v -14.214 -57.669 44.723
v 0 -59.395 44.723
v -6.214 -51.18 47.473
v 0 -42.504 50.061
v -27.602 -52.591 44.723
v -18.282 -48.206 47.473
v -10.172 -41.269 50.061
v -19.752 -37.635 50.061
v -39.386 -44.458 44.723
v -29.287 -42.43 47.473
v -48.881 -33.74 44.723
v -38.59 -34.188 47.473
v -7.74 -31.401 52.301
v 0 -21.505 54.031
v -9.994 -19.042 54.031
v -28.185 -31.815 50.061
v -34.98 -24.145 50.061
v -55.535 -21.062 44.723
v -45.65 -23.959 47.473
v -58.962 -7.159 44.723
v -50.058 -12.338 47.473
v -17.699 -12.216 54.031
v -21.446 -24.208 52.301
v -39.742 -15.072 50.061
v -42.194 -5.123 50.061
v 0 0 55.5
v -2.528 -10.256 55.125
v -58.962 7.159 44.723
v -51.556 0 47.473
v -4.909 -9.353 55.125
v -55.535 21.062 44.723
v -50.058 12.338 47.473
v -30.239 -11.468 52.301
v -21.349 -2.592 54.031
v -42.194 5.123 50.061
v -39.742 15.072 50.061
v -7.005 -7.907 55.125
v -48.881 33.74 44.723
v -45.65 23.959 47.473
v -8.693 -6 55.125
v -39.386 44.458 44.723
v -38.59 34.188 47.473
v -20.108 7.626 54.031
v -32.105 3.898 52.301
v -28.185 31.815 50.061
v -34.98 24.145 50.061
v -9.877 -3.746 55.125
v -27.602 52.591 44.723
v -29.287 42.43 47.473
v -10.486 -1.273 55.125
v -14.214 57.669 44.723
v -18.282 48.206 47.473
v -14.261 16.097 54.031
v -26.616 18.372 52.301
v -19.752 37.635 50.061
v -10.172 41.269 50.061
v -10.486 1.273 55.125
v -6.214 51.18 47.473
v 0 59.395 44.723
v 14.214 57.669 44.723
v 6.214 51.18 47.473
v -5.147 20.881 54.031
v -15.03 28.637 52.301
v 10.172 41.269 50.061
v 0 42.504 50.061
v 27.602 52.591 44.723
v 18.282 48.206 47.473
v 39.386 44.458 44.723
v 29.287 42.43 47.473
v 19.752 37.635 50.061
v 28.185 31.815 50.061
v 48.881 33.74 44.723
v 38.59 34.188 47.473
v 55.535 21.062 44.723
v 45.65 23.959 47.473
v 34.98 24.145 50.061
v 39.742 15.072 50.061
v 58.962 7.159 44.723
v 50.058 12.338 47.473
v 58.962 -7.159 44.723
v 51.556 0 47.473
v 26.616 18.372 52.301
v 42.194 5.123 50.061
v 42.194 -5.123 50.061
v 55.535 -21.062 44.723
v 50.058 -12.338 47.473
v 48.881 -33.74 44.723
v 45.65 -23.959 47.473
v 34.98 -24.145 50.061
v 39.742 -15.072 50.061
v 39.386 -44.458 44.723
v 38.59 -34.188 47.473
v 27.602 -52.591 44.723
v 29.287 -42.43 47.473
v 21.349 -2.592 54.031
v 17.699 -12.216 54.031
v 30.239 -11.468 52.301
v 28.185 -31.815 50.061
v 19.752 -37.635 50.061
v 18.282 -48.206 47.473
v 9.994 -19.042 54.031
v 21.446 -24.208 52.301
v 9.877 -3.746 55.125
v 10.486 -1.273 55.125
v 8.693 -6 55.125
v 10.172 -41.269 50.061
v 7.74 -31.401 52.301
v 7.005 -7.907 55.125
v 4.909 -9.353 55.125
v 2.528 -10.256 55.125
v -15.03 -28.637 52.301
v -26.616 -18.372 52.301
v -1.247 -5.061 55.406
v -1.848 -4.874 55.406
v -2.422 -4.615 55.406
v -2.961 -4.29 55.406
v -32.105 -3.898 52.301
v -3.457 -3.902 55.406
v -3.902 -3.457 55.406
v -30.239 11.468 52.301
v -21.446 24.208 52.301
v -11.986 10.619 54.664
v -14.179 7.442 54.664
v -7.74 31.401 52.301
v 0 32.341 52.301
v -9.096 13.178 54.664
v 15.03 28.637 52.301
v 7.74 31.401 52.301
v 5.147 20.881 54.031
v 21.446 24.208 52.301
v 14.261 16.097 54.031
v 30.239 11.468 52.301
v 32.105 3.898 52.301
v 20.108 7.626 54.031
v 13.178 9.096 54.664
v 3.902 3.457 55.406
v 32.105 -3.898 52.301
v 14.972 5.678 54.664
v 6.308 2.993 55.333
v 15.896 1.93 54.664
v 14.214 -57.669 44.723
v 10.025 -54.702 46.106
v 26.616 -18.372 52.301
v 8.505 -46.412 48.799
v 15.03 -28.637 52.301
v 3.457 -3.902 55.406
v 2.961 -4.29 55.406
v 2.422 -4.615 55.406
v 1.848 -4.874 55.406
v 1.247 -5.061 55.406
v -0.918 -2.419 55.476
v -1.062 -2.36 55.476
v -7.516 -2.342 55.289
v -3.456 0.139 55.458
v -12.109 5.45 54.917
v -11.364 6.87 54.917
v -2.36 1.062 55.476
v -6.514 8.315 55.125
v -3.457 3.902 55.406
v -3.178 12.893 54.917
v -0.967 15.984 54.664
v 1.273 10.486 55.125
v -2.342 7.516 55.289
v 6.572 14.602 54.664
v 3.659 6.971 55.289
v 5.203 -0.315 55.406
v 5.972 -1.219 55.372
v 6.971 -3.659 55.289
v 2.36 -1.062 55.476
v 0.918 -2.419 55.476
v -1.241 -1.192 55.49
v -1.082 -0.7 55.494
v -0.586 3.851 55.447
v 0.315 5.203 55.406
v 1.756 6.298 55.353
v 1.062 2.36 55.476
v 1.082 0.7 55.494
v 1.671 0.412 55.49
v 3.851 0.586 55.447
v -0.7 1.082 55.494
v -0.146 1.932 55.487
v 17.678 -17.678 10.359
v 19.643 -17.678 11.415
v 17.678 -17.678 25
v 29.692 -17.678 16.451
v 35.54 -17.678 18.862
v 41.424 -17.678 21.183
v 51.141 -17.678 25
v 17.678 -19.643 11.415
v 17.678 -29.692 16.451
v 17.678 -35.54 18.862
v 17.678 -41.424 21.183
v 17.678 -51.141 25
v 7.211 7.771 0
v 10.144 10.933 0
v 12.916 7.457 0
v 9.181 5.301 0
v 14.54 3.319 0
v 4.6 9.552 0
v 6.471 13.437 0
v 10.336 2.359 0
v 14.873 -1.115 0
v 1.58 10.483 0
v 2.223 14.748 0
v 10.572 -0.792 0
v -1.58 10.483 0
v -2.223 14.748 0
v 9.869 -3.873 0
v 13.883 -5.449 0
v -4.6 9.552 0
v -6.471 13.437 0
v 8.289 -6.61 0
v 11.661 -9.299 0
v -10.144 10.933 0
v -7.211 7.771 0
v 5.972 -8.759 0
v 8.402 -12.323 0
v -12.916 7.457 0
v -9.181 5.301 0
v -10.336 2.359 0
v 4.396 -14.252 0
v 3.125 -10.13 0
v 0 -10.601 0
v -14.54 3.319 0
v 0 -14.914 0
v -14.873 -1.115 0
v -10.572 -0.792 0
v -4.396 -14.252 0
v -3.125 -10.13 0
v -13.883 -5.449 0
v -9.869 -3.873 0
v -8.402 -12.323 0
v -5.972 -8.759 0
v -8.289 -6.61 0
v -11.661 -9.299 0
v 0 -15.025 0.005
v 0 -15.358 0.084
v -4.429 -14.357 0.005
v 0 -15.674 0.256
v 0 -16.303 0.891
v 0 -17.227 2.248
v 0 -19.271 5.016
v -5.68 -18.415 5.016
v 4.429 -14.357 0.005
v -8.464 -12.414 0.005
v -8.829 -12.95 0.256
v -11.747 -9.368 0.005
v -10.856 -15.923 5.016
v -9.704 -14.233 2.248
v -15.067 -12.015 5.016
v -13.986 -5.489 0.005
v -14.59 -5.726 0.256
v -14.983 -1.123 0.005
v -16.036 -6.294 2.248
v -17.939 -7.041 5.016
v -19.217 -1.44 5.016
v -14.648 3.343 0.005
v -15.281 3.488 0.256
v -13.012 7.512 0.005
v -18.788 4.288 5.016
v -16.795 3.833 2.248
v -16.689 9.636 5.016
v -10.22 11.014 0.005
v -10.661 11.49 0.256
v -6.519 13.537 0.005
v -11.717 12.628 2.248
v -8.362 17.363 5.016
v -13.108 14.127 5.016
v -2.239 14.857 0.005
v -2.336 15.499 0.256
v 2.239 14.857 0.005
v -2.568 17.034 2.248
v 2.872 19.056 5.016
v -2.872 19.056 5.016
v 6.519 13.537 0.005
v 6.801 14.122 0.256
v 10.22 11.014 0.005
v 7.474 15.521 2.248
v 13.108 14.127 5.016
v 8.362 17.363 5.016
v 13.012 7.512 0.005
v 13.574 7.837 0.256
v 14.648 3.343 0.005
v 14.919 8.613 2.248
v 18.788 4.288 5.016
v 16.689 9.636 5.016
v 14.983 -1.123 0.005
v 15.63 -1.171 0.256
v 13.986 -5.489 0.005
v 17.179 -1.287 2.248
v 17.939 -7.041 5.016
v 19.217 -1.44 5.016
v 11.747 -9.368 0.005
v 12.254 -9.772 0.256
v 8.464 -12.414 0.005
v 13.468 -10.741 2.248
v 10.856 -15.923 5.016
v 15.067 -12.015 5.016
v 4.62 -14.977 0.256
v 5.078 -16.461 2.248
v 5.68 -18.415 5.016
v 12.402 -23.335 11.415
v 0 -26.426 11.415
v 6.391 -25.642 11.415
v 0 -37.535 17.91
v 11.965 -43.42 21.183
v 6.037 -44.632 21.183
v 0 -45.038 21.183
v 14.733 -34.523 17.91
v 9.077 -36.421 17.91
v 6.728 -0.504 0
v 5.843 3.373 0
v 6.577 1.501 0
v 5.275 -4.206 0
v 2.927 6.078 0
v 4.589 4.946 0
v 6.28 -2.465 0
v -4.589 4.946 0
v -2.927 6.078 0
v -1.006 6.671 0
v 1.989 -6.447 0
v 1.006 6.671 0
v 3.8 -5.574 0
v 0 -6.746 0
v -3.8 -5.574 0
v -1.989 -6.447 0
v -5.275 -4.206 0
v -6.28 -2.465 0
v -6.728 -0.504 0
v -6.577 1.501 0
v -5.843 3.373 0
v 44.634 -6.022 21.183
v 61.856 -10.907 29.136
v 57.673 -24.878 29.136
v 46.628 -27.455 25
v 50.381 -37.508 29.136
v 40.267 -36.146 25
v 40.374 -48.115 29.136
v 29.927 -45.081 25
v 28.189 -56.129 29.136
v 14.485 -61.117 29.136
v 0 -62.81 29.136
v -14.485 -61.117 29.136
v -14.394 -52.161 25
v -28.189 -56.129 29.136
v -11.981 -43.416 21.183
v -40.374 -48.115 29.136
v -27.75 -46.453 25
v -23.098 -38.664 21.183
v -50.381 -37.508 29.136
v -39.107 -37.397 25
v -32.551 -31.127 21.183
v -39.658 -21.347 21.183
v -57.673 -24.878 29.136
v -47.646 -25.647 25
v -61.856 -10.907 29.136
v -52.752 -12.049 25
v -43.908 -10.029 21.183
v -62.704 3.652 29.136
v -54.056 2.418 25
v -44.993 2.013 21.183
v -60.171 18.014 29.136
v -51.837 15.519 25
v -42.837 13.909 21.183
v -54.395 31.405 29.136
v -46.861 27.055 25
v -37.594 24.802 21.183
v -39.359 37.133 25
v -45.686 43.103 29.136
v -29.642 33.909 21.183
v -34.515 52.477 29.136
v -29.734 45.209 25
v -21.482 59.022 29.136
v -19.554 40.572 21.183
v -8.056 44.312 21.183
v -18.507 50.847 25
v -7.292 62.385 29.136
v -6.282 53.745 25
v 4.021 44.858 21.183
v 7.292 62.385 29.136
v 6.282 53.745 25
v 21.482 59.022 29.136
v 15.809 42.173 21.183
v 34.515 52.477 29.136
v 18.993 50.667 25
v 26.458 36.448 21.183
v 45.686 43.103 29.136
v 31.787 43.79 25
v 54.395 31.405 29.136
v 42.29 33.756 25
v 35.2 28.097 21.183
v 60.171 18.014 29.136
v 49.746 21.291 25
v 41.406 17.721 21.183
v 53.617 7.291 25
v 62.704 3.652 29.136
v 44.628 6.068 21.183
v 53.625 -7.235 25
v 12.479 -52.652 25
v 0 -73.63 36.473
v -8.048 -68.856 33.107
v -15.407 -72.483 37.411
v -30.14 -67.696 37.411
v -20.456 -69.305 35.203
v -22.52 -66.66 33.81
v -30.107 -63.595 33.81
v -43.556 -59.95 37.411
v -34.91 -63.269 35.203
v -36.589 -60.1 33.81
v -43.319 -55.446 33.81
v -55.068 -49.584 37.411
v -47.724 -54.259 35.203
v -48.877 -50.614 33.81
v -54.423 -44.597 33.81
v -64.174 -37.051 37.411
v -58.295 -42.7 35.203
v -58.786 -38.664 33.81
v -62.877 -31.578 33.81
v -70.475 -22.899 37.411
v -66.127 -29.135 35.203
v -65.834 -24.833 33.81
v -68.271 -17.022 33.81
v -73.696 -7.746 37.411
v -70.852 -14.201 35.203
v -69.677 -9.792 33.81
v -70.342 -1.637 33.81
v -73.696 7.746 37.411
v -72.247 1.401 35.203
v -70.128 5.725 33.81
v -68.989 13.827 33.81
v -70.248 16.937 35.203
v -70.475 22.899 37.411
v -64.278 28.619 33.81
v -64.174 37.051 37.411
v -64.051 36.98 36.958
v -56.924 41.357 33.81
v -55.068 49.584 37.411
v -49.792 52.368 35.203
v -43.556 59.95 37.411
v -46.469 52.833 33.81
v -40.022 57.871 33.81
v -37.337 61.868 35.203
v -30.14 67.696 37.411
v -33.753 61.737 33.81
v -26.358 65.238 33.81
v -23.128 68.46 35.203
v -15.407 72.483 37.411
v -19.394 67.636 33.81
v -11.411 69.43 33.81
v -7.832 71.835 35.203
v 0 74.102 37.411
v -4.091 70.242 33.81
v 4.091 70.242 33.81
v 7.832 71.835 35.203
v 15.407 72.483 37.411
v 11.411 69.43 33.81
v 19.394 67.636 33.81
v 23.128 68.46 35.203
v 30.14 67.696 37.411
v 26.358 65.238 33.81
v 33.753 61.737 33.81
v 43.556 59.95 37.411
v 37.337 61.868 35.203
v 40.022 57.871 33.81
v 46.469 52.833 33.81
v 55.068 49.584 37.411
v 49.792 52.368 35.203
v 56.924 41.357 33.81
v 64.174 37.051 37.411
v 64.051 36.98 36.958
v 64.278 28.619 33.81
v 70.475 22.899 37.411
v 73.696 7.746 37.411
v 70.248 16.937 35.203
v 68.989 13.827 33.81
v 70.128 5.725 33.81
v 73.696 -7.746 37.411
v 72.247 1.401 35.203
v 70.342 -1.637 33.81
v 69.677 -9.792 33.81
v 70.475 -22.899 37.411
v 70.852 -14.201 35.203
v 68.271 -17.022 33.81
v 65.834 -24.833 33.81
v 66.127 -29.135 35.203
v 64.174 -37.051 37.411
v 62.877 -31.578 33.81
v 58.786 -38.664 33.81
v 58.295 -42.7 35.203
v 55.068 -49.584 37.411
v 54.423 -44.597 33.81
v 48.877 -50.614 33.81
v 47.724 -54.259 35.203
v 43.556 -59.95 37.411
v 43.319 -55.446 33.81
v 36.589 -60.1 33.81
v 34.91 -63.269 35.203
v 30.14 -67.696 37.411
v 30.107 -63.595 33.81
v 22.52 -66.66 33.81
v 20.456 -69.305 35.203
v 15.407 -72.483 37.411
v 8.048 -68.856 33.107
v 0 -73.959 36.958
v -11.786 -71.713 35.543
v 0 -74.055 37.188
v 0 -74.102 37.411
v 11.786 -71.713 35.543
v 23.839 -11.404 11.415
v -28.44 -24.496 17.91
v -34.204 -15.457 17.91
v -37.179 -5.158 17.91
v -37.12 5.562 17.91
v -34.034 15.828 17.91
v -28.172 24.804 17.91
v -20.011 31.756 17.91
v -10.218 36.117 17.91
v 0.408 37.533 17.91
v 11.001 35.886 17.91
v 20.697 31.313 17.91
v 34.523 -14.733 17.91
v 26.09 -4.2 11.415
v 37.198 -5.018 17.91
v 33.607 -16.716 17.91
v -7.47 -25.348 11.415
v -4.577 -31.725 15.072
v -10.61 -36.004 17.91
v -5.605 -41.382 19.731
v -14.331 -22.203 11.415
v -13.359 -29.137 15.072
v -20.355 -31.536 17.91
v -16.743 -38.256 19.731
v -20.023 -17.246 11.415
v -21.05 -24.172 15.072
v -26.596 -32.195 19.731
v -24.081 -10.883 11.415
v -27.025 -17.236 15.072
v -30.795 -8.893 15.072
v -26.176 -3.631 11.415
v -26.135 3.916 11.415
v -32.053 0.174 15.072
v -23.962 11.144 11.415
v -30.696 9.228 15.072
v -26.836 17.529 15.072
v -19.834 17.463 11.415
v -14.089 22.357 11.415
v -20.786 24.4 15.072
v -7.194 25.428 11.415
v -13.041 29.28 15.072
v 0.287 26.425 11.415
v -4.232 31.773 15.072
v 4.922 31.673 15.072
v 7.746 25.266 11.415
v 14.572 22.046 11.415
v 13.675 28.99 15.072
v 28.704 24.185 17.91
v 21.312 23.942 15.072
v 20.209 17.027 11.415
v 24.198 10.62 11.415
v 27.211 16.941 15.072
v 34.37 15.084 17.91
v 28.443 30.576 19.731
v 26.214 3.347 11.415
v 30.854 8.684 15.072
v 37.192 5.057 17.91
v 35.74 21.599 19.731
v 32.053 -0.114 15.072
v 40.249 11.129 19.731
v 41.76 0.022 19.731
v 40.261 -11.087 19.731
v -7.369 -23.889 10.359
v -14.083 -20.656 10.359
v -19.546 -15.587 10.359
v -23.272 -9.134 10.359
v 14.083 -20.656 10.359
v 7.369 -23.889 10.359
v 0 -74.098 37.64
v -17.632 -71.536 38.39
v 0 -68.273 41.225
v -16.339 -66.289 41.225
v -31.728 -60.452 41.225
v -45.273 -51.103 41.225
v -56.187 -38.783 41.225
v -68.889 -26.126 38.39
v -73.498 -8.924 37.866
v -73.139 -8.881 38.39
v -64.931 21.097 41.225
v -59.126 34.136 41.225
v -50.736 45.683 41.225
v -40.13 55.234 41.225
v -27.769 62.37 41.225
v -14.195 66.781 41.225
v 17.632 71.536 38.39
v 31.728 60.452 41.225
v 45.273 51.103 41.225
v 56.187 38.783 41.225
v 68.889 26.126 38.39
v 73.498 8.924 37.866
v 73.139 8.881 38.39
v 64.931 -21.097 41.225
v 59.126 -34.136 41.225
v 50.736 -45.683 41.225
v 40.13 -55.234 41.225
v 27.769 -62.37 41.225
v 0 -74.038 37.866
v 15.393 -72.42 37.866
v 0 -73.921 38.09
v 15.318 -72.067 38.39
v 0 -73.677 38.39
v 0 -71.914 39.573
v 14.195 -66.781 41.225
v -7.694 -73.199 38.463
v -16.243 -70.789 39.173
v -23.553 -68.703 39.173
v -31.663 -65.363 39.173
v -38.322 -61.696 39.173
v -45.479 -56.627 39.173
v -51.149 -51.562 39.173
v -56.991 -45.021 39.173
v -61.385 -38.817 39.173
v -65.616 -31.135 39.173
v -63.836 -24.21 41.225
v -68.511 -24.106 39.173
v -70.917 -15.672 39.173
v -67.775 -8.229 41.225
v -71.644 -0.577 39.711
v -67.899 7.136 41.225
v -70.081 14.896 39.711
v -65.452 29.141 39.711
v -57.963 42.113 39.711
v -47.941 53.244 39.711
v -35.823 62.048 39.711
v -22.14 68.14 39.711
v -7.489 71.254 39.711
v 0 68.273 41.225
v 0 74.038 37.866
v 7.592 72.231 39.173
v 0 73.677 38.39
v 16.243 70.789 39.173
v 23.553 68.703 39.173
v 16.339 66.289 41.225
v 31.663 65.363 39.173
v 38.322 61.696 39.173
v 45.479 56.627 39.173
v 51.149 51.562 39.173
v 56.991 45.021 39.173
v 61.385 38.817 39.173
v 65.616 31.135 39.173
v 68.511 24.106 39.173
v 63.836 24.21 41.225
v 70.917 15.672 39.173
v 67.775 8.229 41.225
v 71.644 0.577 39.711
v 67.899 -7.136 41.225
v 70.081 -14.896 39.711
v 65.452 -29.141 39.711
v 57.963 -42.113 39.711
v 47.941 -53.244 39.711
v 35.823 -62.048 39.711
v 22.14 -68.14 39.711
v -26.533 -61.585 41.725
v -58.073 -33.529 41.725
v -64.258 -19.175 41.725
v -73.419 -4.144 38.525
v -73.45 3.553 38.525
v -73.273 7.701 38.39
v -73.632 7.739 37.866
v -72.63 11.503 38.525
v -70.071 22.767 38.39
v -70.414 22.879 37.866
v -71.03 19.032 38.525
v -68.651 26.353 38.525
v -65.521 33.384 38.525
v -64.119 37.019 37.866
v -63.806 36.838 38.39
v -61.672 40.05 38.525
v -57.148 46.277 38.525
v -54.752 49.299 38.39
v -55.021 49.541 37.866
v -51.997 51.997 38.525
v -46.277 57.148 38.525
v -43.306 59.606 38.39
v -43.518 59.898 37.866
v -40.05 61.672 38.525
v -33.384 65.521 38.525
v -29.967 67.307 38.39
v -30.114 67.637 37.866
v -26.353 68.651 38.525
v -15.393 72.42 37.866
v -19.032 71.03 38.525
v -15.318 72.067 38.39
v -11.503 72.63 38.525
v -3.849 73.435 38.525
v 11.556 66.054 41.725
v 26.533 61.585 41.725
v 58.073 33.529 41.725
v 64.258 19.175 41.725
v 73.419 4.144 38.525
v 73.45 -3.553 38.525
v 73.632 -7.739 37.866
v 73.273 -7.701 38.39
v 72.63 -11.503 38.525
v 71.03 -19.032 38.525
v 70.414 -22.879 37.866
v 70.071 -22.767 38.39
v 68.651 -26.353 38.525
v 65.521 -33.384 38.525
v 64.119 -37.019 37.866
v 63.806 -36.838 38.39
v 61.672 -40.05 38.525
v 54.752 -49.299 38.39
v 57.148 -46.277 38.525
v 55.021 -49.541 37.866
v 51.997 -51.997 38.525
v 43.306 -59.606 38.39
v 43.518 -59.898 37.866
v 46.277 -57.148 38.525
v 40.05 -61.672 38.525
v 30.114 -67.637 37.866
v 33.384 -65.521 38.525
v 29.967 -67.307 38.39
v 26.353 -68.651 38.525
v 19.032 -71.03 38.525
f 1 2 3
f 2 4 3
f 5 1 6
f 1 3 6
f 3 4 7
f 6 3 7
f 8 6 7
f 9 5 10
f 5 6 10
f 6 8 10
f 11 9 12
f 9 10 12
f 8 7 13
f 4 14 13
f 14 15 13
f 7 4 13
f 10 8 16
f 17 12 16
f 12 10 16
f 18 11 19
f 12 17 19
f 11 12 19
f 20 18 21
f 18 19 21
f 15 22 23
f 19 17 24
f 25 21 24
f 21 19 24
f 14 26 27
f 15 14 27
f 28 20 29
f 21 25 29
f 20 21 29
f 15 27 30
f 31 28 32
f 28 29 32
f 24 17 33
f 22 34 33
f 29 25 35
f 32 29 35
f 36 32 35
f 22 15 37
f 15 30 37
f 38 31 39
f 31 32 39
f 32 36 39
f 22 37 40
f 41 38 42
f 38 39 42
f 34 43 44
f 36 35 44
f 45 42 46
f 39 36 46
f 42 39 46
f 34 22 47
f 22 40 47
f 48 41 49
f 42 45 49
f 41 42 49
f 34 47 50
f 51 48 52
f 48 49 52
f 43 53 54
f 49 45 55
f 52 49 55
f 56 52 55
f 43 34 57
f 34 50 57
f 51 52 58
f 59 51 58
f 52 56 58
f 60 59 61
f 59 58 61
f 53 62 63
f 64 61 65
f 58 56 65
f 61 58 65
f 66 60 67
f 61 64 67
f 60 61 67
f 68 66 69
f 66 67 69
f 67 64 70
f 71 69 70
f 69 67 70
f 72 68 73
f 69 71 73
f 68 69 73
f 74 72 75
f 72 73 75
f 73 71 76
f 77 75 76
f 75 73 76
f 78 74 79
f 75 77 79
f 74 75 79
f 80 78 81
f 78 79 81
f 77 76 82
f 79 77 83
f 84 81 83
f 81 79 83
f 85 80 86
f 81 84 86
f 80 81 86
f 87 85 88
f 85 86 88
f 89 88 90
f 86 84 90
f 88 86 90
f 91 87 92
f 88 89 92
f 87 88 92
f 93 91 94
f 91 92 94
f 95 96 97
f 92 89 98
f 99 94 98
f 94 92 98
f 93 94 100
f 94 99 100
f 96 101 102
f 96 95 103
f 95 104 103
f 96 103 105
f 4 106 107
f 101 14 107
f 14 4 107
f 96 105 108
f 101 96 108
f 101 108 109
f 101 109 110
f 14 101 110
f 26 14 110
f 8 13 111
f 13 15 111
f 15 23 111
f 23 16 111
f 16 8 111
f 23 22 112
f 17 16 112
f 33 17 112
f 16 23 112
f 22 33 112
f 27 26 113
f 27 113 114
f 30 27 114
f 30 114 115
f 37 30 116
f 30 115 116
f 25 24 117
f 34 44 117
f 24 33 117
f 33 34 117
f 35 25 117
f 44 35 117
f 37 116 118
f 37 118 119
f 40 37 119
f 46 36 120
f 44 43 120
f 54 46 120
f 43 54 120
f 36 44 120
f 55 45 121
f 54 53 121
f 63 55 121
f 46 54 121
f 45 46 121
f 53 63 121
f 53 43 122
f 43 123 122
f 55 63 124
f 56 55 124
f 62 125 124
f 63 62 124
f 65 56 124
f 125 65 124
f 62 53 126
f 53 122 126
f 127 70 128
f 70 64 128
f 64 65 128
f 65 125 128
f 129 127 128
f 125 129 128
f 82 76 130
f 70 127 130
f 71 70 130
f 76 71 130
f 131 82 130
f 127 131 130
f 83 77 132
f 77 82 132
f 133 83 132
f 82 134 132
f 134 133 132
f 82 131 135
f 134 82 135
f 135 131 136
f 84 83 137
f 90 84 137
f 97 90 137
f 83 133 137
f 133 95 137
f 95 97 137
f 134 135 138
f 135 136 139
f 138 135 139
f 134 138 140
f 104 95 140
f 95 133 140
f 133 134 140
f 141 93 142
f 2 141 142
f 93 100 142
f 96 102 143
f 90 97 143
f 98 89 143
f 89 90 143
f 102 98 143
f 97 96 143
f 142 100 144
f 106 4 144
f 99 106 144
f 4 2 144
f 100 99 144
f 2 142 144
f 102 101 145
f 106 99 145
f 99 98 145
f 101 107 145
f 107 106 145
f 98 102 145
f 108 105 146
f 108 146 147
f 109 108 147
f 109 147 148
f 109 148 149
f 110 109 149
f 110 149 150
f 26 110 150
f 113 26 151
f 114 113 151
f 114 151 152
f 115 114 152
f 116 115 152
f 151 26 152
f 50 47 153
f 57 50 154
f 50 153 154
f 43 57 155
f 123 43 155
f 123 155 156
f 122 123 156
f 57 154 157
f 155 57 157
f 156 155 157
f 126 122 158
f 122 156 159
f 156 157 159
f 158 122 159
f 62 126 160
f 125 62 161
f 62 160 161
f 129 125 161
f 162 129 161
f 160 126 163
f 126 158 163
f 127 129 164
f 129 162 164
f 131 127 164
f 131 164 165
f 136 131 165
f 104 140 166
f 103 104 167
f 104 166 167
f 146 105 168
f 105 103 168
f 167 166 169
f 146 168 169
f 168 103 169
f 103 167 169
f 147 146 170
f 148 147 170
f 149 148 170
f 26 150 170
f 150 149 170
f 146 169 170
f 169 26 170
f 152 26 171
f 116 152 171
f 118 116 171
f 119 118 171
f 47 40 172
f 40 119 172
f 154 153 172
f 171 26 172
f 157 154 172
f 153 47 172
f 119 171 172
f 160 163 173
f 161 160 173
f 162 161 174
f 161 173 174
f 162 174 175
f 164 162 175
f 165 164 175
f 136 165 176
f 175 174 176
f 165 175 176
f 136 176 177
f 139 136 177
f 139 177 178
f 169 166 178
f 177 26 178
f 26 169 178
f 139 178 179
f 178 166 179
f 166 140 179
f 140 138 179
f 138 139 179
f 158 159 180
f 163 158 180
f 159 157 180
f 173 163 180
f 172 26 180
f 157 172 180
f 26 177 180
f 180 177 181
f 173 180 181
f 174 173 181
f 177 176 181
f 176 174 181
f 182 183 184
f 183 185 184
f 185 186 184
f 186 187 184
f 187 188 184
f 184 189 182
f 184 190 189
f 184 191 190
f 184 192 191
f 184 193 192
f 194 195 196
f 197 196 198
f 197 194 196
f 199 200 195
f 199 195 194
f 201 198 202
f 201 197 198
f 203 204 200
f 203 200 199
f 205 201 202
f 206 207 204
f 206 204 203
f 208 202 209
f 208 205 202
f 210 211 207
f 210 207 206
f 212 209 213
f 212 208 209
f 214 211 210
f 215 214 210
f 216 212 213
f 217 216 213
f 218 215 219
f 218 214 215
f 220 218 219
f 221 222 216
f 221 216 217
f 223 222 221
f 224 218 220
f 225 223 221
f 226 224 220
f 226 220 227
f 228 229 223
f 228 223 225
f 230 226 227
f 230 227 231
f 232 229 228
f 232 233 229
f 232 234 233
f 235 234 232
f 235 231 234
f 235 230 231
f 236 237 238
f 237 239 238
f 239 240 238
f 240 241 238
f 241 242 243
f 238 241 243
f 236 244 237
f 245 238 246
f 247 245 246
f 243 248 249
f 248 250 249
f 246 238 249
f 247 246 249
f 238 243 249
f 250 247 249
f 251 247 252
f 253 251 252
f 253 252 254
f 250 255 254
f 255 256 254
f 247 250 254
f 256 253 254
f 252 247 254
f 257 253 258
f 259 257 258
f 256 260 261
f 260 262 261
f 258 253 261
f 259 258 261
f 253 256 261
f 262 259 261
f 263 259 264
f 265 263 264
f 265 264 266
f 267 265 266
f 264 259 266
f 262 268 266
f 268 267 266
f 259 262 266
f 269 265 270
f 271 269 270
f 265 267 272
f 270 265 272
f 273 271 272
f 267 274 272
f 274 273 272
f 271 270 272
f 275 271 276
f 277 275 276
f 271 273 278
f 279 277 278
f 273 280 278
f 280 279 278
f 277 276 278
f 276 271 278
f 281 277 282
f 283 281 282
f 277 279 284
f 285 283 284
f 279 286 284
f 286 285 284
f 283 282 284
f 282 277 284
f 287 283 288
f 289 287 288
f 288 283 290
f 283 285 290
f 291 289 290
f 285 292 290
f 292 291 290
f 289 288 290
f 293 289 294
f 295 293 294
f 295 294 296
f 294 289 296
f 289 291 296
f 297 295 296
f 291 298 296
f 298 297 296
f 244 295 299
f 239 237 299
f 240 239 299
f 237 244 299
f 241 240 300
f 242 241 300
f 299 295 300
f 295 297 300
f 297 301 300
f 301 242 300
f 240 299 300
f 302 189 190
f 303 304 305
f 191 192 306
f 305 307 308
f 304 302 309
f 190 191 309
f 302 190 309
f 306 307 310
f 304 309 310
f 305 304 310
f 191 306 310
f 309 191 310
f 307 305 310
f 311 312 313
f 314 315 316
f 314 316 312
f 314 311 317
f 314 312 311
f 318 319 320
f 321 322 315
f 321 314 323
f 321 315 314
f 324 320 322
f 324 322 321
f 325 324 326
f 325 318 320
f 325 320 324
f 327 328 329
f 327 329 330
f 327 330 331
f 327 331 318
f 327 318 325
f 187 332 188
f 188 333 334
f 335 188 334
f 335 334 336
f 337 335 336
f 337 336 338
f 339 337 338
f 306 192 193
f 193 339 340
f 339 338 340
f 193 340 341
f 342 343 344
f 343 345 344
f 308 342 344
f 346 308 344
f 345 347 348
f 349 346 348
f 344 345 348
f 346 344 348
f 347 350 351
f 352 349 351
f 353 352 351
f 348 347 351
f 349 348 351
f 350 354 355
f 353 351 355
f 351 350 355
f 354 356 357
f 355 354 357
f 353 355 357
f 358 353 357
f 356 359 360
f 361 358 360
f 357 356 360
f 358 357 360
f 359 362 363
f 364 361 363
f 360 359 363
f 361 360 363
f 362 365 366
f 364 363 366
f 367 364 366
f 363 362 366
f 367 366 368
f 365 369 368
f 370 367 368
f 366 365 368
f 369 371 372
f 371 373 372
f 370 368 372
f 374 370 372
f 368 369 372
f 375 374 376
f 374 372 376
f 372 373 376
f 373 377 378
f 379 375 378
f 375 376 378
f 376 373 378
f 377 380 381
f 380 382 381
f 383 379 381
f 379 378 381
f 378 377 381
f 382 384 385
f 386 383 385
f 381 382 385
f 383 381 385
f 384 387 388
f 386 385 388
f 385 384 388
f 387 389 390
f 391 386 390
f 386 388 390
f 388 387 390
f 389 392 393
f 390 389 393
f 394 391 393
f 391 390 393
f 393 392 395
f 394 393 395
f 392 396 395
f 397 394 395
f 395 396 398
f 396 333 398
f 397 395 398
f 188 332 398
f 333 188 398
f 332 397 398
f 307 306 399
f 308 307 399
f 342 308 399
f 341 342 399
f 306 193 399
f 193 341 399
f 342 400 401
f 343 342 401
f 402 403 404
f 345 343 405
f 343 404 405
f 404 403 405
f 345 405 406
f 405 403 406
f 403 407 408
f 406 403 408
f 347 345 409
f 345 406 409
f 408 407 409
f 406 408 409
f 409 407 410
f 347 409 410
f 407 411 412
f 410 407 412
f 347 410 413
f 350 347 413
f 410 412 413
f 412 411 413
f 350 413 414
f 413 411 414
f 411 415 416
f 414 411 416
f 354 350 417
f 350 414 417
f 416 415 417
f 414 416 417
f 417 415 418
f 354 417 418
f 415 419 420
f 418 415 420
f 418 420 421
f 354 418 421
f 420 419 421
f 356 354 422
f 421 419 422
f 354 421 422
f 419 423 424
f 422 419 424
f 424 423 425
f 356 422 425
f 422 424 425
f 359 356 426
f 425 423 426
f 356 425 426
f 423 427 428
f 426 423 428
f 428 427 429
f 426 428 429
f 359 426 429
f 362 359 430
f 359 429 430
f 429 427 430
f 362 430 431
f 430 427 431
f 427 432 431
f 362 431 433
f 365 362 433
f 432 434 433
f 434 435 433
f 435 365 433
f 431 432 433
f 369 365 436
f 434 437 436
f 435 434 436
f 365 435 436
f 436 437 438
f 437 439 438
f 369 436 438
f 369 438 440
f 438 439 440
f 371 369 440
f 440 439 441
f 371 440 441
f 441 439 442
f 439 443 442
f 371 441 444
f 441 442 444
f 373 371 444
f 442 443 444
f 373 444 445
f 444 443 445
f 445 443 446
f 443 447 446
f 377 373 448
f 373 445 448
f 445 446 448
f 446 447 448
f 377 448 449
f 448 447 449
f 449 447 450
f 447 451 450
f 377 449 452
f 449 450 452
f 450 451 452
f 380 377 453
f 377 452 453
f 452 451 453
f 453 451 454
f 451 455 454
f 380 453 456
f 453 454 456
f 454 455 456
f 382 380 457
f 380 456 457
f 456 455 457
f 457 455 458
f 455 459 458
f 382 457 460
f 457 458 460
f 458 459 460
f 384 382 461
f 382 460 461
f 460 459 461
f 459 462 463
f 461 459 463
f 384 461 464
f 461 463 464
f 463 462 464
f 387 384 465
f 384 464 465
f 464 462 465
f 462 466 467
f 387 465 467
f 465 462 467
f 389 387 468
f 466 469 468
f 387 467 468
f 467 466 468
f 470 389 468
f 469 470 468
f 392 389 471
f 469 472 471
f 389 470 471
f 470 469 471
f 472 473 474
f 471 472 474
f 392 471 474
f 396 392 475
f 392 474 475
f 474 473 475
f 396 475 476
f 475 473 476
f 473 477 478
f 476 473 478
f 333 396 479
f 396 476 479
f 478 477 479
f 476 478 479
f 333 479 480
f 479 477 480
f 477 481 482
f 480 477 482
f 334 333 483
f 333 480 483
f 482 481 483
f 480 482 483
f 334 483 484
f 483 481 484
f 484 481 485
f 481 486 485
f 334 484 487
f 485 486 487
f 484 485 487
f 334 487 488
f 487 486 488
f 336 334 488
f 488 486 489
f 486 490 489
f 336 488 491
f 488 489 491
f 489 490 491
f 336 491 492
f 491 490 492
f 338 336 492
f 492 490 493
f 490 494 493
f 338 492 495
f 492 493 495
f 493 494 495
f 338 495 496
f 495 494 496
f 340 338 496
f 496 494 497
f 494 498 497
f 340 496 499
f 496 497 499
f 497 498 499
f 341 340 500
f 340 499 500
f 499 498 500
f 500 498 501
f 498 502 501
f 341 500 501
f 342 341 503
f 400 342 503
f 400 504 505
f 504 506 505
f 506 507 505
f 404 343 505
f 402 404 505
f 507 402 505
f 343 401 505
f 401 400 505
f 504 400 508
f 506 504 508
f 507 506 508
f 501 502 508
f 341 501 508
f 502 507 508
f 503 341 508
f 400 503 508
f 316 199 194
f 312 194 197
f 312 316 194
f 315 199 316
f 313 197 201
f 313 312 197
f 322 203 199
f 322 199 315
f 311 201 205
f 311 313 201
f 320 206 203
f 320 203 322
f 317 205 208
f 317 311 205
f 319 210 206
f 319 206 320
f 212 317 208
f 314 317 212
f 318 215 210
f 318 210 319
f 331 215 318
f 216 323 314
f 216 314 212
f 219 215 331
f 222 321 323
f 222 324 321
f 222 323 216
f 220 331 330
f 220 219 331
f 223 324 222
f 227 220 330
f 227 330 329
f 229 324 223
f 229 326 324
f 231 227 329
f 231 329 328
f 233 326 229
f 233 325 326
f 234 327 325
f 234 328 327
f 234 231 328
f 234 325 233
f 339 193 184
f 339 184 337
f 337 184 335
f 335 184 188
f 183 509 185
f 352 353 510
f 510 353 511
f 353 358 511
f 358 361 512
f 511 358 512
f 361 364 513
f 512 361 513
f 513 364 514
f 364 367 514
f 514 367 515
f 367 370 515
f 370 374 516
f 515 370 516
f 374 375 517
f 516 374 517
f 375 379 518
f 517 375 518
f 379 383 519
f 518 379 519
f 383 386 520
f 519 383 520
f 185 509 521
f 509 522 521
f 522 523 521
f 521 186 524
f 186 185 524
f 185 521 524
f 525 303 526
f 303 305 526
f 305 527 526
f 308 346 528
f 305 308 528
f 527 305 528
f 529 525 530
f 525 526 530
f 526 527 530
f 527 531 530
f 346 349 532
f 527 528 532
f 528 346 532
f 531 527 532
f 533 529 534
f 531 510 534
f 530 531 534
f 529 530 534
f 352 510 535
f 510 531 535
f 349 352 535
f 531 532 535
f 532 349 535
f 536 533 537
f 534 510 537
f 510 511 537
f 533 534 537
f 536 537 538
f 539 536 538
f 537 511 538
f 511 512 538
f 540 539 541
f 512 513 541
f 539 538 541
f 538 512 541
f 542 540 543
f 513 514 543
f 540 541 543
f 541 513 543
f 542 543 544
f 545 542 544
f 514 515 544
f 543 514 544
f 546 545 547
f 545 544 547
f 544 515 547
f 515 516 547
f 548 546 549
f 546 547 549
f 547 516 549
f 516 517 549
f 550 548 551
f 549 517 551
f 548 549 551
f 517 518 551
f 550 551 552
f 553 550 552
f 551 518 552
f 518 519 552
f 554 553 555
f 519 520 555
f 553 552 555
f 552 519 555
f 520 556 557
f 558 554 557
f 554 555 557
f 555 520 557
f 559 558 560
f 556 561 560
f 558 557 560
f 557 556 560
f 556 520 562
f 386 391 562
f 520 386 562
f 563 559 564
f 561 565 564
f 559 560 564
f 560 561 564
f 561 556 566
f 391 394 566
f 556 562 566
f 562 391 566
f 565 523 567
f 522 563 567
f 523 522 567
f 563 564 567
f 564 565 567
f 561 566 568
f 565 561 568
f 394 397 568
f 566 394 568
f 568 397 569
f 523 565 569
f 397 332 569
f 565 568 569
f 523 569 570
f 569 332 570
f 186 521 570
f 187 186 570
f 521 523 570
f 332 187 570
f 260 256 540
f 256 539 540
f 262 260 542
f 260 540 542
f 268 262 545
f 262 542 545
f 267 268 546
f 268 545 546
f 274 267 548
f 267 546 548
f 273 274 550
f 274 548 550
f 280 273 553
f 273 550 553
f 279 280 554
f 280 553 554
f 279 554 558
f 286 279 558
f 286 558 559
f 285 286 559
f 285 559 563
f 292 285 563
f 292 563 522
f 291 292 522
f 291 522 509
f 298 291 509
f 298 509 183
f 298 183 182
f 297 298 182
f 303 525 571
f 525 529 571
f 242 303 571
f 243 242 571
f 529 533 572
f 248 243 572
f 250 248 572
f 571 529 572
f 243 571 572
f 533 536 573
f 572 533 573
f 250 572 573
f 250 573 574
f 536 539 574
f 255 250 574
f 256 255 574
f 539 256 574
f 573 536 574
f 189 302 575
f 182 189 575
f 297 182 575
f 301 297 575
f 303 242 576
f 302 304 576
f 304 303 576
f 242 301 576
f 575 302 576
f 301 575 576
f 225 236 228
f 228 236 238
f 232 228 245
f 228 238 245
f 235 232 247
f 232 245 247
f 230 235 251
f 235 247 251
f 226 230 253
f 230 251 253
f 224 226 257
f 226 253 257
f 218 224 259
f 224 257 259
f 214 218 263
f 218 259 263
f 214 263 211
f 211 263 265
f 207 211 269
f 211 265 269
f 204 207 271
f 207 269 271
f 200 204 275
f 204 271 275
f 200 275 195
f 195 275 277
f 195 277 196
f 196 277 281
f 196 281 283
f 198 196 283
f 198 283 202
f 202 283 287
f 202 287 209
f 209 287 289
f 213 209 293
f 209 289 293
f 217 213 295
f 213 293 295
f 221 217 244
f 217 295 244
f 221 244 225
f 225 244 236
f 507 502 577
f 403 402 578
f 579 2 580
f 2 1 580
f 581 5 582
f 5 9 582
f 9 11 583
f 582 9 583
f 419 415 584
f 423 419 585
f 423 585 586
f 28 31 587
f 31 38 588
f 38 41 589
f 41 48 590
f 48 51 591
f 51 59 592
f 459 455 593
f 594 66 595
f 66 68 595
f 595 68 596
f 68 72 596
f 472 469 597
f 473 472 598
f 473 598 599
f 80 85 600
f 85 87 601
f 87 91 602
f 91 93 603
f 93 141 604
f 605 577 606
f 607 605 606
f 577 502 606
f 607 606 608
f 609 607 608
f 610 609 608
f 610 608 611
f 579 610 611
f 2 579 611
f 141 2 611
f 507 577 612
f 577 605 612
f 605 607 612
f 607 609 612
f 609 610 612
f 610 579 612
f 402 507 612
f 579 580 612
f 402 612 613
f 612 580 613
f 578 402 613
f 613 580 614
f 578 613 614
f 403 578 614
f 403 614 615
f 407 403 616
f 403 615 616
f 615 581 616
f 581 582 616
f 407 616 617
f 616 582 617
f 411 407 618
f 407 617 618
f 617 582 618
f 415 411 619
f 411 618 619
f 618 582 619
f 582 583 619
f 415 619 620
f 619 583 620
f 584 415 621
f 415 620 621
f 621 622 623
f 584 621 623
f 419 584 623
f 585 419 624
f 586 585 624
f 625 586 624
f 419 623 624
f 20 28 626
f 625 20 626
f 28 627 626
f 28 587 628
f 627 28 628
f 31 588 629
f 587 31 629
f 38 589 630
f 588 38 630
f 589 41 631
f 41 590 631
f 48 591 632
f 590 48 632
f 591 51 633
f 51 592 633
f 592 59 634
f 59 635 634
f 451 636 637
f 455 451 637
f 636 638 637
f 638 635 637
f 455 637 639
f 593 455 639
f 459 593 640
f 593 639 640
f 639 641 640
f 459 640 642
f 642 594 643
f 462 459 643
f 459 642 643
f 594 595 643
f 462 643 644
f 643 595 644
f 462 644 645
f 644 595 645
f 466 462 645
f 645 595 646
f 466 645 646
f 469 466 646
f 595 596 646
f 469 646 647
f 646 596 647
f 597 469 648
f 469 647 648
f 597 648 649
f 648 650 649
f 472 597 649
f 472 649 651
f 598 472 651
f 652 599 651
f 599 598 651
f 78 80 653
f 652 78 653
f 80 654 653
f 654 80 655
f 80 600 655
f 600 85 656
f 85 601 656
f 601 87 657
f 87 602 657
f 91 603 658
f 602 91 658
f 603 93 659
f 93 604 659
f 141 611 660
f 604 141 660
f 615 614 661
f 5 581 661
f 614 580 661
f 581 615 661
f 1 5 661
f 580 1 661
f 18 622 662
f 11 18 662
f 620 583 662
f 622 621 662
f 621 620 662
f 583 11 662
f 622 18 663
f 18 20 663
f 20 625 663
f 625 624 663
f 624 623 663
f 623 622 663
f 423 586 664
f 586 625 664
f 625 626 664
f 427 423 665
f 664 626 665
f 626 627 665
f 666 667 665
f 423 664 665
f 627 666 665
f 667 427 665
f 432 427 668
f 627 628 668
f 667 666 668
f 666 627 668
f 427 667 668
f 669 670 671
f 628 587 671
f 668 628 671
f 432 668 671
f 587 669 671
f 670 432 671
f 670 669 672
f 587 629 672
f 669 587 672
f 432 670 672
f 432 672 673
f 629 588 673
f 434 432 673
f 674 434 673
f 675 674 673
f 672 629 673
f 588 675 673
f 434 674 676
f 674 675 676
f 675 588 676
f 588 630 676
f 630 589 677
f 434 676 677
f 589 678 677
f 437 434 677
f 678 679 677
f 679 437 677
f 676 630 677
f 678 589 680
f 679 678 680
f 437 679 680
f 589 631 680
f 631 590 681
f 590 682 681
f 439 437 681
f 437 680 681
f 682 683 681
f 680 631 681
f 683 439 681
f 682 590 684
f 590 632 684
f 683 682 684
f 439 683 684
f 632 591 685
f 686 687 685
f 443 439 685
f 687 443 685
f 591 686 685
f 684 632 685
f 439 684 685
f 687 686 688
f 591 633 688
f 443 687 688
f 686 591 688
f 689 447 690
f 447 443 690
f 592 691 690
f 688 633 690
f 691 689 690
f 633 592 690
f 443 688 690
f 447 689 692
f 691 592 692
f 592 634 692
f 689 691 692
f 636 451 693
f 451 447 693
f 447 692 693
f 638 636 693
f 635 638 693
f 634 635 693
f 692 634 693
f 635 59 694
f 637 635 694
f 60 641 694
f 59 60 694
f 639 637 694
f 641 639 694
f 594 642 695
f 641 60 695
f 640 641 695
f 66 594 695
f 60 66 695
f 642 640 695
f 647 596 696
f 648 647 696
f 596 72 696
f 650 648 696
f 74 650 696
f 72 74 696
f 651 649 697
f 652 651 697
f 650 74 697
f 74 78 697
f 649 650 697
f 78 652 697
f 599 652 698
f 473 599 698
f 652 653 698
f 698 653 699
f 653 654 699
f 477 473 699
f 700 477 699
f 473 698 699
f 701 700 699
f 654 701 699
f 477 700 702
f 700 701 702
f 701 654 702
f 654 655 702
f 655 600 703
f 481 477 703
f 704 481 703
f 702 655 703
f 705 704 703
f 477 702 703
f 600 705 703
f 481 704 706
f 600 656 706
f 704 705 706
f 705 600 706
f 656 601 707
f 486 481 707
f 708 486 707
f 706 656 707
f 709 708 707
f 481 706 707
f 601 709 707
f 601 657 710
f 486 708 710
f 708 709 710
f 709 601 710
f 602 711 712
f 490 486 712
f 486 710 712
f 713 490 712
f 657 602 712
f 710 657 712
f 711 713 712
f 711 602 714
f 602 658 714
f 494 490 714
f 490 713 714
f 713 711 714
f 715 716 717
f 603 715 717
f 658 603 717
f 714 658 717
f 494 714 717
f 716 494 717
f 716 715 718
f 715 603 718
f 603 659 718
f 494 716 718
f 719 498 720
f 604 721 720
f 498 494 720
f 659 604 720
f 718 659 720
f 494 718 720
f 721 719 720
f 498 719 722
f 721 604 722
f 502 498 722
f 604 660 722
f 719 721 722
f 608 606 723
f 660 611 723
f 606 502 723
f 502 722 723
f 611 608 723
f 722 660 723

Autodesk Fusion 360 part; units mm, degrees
sketch "antenna profile" plane through (0, 0, 0) normal (1, 0, 0) x (0, 1, 0)
  line L0 (0, 55.5) -> (0, 0)
  spline S0 degree 5 poles (-14.9144, 0) (-15.1986, 0) (-15.7331, 0.1601) (-16.4411, 0.8835) (-17.3417, 2.6008) (-19.257, 5.1416) (-21.0386, 6.927) (-22.1024, 8.041) (-23.9195, 9.5767) (-27.6306, 12.3835) (-32.1149, 15.2307) (-36.3626, 17.4398) (-39.8889, 18.971) (-42.5997, 20.0513) (-44.7474, 21.0551) (-47.2507, 22.1995) (-50.5943, 23.5558) (-54.5655, 25.1581) (-58.7737, 26.9955) (-62.7402, 29.0184) (-66.4348, 31.2125) (-69.908, 33.4457) (-72.712, 35.4368) (-74.3486, 36.9963) (-74.3085, 38.1824) (-72.3633, 39.478) (-68.9176, 40.998) (-64.5427, 42.7402) (-59.8013, 44.5945) (-54.755, 46.4647) (-49.1279, 48.2967) (-42.9246, 50.0271) (-36.1857, 51.6013) (-29.0488, 52.9679) (-21.681, 54.0822) (-14.2672, 54.9071) (-8.4331, 55.3128) (-4.1677, 55.466) (-1.38, 55.5) (0, 55.5) knots 0 0 0 0 0 0 0.028571 0.057143 0.085714 0.114286 0.142857 0.171429 0.2 0.228571 0.257143 0.285714 0.314286 0.342857 0.371429 0.4 0.428571 0.457143 0.485714 0.514286 0.542857 0.571429 0.6 0.628571 0.657143 0.685714 0.714286 0.742857 0.771429 0.8 0.828571 0.857143 0.885714 0.914286 0.942857 0.971429 1 1 1 1 1 1
  line L1 (-6.7465, 0) -> (-23.0822, 0)
  line L2 (-8.522, -7.6693) -> (-30.0208, 17.7018)
  line L3 (-10.6014, 0) -> (-42.251, 22.8292)
  line L4 (-35.5679, 16.868) -> (-53.4299, 25.0058)
  line L5 (-72.2398, 39.8804) -> (-46.5495, 49.5647)
  line L6 (-14.9866, 55.5) -> (14.9866, 55.5)
  line L7 (0, 0) -> (-14.9144, 0)
  line L8 (-47.055, 20.4473) -> (-78.5648, 37.8239)
  line L9 (-73.6324, 32.8325) -> (-74.5715, 41.9888)
  point P0 (-62.8099, 29.1356)
  point P1 (-26.4262, 11.4146)
  point P2 (-19.2714, 5.0163)
  point P3 (-44.4989, 20.9369)
  point P4 (-59.3947, 44.7226)
  point P5 (-74.102, 37.4107)
  dimension "d29" = 55.5
sketch "Sketch8" plane through (0, 0, 0) normal (0, 0, 1) x (1, 0, 0)
revolve "Revolve1" add sketch "antenna profile" angle 360 about axis through (0, 0, 55.5) along (0, 0, -1) contours L0 S0 L1 L3 L7 | S0 L1 L2 L3 L7 | S0 L2 L3 | S0 L2
ref_plane "WorkPlane1" through (0, 0, 25) normal (0, 0, 1) x (1, 0, 0)
sketch "mounting" plane through (0, 0, 25) normal (0, 0, 1) x (1, 0, 0)
  circle A0 centre (0, 0) radius 25
  circle A1 centre (0, 0) radius 75
  line L0 (0, -75) -> (0, -25)
  line L1 (25, -0.0001) -> (75, -0.0001)
  line L2 (17.6777, -72.8869) -> (17.6777, -17.6777)
  line L3 (72.8869, -17.6777) -> (17.6777, -17.6777)
  line L4 (0, 0) -> (53.033, -53.033)
  dimension "d32" = 50
  dimension "d33" = 150
extrude "Extrude3" cut sketch "mounting" against normal blind 40 contours A1 L2 L4 | A1 L3 L4
